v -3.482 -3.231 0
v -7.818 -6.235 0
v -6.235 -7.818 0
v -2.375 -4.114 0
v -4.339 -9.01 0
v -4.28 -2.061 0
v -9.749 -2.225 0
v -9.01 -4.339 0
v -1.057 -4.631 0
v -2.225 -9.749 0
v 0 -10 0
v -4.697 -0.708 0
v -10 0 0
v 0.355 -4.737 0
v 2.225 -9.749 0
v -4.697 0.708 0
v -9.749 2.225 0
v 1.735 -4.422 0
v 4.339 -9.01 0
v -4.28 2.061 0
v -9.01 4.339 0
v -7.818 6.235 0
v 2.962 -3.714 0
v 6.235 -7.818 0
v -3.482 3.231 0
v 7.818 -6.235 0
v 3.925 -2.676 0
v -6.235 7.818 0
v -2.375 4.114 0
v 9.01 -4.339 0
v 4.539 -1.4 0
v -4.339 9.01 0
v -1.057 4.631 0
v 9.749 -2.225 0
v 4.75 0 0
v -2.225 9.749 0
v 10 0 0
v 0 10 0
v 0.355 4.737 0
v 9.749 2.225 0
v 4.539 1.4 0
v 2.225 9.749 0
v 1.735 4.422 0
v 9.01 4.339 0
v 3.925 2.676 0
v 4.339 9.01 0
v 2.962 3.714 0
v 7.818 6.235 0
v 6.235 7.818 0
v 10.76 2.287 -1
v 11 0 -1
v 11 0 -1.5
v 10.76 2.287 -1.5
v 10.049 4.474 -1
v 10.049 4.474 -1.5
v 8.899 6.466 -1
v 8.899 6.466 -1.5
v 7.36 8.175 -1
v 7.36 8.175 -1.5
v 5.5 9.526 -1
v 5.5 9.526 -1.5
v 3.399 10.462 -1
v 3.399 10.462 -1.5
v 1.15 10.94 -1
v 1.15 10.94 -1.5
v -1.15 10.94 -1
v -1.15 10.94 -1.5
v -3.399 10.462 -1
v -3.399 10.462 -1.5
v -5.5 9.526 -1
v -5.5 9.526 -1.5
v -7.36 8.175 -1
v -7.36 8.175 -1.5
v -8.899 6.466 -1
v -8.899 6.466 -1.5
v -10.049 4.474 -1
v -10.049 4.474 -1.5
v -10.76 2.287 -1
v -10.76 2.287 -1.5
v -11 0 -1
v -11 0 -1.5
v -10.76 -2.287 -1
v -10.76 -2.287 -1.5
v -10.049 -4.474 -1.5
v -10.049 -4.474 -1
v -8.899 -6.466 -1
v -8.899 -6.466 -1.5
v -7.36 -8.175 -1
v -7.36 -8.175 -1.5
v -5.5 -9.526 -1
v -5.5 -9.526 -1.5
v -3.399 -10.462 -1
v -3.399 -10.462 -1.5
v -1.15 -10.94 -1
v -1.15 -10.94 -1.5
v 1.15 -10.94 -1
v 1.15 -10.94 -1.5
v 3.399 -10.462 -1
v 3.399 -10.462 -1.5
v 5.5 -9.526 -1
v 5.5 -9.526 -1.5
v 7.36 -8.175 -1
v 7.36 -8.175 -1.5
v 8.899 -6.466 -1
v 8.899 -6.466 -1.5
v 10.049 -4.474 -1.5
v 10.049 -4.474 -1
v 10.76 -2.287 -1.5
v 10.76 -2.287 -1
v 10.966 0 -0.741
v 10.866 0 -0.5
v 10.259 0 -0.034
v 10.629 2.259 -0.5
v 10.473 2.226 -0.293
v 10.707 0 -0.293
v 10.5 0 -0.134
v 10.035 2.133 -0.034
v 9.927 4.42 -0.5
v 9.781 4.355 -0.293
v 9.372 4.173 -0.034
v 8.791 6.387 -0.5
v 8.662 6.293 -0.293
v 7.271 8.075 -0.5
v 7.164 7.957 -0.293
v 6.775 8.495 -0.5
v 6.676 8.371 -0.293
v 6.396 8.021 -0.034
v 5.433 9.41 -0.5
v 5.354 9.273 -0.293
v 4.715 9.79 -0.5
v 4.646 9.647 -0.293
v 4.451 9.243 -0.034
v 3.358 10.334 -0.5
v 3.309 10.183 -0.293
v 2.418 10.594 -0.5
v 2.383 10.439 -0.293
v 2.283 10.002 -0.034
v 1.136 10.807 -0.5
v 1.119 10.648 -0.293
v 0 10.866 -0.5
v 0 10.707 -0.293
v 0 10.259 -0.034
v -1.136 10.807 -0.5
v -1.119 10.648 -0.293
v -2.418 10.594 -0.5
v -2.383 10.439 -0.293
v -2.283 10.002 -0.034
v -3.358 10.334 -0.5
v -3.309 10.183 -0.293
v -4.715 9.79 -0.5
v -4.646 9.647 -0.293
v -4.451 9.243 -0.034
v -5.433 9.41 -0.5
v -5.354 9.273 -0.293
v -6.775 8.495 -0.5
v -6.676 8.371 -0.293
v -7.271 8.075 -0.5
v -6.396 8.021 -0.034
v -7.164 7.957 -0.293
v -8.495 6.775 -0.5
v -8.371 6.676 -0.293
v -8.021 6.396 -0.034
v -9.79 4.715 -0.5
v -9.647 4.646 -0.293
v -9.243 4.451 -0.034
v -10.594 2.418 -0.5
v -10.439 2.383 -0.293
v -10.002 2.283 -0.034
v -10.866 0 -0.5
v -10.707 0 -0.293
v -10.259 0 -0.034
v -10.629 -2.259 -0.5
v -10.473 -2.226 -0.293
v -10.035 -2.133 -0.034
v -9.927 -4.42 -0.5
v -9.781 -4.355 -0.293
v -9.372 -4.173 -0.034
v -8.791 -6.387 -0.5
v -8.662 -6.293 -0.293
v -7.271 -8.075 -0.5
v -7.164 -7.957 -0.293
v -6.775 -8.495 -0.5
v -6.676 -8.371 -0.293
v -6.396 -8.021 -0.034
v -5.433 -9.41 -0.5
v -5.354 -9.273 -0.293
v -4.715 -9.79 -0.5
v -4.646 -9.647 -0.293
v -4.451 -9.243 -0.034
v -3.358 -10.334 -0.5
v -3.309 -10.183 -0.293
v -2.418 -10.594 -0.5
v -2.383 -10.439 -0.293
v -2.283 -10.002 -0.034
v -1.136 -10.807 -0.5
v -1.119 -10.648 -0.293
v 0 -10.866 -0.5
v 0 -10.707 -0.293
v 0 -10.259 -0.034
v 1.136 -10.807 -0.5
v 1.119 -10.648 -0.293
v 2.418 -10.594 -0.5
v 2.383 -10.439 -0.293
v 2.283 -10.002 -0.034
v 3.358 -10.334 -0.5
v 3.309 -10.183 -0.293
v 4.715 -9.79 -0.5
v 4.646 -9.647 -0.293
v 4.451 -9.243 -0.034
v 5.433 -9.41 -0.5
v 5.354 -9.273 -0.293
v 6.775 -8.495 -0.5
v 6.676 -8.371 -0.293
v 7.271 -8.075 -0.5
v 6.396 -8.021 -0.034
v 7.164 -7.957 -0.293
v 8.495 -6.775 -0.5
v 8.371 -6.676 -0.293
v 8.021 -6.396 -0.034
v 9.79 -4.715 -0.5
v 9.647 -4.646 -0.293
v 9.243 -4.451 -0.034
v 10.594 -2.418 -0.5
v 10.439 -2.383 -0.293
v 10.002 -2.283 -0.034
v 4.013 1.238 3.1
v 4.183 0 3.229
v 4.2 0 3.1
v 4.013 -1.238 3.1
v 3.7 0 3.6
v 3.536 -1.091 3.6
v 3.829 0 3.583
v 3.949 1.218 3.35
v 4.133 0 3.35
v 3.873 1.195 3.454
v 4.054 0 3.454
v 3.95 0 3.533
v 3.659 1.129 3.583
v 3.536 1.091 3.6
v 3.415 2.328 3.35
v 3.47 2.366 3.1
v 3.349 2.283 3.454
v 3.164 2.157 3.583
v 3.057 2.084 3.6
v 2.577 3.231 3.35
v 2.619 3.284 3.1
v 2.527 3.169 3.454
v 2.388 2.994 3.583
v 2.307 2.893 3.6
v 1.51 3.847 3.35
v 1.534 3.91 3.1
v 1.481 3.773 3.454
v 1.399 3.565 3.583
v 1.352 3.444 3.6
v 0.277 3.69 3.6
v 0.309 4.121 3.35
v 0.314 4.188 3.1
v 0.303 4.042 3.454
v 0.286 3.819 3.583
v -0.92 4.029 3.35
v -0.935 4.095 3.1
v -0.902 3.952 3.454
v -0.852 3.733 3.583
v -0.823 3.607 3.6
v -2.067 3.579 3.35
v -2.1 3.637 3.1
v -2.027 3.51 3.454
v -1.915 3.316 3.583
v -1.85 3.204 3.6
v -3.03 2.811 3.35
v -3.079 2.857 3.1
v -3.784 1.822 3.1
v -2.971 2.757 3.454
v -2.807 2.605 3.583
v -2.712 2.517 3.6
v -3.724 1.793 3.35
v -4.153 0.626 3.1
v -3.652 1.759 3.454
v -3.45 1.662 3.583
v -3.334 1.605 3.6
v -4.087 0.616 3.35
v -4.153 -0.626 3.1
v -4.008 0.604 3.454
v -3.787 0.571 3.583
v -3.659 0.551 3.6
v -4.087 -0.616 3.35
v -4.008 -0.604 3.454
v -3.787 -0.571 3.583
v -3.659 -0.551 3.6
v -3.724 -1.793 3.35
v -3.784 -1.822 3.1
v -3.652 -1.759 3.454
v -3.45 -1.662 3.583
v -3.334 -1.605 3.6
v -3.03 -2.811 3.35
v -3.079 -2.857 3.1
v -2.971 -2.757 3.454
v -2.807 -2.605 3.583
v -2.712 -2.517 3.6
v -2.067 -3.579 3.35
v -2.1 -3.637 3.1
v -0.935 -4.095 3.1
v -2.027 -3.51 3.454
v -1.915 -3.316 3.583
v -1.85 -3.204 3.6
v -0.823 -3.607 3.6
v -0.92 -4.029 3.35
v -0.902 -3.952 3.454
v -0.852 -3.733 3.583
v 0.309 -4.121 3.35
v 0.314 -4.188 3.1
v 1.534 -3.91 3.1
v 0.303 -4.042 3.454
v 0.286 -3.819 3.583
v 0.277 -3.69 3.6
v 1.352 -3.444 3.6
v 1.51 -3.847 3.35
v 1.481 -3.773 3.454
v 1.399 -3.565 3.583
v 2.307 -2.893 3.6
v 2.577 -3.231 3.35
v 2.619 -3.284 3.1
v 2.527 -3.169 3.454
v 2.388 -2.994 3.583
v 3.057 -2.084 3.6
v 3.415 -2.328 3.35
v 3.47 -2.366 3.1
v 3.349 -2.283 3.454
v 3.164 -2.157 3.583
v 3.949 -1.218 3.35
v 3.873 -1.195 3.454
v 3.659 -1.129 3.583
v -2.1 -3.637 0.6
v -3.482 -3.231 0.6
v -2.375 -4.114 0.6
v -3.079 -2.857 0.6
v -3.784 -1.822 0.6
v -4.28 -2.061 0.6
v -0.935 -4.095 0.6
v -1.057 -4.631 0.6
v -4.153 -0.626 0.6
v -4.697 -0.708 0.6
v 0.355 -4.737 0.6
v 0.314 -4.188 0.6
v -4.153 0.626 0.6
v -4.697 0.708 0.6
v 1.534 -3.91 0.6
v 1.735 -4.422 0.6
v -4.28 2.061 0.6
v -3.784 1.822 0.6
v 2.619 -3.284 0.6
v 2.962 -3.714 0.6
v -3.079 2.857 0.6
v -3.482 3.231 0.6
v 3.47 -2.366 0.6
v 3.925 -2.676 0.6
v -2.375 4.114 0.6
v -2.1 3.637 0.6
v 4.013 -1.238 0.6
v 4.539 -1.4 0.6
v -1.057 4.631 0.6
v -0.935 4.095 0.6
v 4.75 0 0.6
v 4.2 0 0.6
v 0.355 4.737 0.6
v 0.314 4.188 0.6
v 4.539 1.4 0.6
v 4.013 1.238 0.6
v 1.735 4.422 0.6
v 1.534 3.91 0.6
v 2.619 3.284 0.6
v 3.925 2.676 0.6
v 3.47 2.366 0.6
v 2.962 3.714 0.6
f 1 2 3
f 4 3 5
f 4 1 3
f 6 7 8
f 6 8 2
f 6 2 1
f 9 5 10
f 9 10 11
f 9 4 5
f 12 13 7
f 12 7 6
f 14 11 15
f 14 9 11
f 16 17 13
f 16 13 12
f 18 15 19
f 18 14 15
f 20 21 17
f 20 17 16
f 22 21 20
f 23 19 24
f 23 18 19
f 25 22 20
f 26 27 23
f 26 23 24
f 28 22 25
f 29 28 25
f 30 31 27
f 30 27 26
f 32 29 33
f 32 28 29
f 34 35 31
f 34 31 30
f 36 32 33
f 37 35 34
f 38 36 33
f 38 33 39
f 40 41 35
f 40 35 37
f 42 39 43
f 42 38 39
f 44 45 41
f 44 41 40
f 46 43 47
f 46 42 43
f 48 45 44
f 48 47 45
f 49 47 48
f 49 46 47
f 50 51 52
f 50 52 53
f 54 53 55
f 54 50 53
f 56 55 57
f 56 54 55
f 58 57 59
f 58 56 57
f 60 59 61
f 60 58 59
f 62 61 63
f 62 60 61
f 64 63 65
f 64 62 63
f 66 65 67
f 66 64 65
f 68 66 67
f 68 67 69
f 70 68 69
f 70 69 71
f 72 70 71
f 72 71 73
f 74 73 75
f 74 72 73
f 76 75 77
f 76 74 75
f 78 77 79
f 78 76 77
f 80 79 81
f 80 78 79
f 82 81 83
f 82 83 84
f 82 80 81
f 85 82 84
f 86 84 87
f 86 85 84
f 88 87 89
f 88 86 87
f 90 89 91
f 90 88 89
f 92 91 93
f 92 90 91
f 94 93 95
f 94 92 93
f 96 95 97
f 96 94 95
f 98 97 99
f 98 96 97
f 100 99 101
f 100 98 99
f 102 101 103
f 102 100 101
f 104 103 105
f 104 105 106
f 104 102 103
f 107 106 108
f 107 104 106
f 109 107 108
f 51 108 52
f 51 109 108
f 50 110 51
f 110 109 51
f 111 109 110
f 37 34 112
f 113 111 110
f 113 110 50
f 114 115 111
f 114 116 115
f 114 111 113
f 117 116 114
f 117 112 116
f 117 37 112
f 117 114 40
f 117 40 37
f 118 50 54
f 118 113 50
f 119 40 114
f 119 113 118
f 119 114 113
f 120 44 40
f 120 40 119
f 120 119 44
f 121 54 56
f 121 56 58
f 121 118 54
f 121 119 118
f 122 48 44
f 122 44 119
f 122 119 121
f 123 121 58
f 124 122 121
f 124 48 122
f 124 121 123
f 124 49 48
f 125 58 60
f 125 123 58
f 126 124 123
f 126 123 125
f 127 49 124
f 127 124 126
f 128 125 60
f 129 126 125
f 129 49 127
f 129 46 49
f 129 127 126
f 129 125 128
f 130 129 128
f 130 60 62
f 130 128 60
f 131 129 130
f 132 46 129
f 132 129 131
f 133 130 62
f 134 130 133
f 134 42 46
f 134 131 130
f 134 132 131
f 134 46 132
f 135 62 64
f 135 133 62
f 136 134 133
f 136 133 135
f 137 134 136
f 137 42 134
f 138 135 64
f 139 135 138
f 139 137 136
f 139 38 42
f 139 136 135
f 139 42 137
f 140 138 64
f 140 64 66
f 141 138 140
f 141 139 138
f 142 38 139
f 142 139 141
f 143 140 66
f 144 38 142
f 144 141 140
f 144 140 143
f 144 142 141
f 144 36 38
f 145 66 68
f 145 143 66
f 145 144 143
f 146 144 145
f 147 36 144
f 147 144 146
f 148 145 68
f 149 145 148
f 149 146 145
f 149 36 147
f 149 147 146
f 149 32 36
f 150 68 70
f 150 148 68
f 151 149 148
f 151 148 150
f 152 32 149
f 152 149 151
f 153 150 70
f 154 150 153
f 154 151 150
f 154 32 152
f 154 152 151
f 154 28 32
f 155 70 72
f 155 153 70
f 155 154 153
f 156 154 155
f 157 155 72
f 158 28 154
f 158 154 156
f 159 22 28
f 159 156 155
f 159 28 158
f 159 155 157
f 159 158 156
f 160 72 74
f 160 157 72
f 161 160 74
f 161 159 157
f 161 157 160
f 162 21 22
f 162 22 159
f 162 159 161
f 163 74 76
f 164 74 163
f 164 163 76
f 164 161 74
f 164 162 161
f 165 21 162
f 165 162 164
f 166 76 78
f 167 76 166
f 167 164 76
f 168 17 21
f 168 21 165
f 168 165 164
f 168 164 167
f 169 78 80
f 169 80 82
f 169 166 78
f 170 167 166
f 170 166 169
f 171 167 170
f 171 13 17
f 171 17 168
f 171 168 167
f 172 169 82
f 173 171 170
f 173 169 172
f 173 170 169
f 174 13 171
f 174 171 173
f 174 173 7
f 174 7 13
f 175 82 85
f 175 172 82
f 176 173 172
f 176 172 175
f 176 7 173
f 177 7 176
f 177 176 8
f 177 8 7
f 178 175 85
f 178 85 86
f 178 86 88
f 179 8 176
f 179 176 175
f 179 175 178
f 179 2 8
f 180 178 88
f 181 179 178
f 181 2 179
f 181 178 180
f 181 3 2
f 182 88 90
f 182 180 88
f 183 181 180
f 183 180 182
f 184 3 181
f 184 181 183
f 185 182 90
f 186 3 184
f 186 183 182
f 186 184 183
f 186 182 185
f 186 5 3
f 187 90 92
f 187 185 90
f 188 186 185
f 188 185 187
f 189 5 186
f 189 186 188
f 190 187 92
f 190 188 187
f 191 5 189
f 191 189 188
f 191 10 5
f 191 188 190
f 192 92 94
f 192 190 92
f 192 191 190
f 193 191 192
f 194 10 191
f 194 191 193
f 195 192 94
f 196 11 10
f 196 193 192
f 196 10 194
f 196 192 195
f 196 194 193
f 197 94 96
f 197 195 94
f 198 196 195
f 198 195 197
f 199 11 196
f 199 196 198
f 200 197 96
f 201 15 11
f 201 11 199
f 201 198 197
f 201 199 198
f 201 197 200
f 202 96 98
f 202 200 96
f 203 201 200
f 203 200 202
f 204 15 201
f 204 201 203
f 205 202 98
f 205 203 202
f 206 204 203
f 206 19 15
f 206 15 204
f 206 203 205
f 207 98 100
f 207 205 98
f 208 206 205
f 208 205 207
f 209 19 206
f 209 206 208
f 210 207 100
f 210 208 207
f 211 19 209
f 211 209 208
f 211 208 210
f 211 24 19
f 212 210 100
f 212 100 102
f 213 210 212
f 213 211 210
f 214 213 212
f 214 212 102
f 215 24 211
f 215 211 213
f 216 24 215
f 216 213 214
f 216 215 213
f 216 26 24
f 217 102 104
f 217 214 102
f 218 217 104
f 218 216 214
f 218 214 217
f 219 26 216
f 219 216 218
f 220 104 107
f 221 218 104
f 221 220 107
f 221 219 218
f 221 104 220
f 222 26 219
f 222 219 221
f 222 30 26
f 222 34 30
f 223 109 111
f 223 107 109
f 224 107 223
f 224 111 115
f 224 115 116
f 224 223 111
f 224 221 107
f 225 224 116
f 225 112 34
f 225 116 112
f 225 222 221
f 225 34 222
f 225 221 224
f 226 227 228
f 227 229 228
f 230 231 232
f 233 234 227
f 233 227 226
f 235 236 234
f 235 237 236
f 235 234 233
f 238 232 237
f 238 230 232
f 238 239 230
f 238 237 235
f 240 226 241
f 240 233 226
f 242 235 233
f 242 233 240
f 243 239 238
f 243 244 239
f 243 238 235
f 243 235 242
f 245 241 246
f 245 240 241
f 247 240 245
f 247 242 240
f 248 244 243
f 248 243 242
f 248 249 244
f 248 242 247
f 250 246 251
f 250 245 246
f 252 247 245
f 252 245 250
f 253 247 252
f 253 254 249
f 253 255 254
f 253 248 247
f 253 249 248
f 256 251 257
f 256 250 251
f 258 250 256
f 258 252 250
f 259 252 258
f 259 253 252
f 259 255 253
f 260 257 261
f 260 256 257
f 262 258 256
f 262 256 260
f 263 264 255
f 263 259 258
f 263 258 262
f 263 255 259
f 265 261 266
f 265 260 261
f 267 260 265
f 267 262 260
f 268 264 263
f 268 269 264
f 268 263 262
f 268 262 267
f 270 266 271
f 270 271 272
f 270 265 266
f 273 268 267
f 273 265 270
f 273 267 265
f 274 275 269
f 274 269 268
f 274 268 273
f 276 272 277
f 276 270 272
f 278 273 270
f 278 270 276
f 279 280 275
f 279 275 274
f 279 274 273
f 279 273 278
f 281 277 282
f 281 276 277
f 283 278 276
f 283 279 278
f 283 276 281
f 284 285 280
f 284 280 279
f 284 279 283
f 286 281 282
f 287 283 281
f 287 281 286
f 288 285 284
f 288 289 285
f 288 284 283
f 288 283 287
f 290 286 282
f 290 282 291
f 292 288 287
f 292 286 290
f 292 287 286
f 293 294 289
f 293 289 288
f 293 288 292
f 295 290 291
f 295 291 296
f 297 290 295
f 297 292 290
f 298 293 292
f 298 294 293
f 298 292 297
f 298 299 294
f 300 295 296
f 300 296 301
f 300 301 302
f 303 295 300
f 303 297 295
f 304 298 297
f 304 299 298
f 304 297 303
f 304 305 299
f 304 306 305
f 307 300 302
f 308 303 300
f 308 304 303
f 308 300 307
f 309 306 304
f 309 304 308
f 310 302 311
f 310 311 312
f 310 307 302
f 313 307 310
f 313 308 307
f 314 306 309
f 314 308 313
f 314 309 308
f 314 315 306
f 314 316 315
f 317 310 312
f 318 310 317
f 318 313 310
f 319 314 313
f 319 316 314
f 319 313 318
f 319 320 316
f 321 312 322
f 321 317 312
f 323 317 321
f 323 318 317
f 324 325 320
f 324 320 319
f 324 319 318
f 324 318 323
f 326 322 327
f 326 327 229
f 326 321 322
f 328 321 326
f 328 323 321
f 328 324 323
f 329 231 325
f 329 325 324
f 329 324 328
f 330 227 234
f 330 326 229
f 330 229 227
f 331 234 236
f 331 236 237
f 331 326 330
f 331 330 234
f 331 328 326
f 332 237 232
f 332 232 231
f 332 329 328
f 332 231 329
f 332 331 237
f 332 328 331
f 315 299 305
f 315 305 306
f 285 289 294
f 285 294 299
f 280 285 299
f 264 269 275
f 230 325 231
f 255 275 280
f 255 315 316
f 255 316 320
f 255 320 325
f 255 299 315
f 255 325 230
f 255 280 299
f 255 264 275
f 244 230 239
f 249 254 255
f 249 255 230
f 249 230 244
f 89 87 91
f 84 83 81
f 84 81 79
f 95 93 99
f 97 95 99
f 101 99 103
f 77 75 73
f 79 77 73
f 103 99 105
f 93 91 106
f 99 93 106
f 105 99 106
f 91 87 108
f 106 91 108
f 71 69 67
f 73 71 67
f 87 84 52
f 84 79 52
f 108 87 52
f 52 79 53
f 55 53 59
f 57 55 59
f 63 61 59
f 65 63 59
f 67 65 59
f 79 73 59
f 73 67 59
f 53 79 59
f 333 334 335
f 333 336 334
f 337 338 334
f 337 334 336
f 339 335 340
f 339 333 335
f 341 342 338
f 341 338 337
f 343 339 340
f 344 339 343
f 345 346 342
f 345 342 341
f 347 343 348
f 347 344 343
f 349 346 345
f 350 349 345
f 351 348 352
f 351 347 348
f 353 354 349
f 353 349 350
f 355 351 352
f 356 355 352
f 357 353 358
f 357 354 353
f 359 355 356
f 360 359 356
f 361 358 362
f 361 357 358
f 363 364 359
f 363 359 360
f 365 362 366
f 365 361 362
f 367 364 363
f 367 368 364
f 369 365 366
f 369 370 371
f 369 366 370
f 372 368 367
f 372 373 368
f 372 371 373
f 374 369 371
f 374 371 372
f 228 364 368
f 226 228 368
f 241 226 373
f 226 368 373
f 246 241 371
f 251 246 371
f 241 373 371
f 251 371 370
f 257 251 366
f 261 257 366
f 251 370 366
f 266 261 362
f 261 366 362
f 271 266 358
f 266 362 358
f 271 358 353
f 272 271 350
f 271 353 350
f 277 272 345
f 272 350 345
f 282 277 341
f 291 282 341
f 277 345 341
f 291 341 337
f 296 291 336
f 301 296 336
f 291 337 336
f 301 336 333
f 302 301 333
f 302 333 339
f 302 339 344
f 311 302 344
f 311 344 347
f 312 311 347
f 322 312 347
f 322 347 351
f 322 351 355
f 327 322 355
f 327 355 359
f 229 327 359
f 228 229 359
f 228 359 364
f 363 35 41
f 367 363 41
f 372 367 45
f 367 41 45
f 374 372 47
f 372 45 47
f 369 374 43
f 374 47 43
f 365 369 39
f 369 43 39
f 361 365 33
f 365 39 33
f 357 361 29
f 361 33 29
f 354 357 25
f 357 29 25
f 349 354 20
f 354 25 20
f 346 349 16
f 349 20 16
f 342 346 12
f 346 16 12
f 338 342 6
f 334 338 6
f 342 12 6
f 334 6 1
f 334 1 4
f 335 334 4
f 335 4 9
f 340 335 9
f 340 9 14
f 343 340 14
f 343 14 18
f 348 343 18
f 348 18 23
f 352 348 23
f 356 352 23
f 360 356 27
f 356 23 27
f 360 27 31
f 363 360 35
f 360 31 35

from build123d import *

# Parameters (mm, degrees)
F0_R     = 11
F0_R_2   = 4.75
F0_R_3   = 4.2
F1_DEPTH = 1.5
F2_DEPTH = 3.6
F3_R     = 1
F4_R     = 0.5
F5_DEPTH = 0.6


with BuildPart() as f1:
    # F0 (on Top) → F1 (new body)
    with BuildSketch(Plane.XY):
        Circle(F0_R)
        Circle(F0_R_2, mode=Mode.SUBTRACT)
        Circle(F0_R_2)
        Circle(F0_R_3, mode=Mode.SUBTRACT)
        Circle(F0_R_3)
    extrude(amount=-F1_DEPTH)

    # F0 (on Top) → F2 (join)
    with BuildSketch(Plane.XY):
        Circle(F0_R_3)
    extrude(amount=F2_DEPTH)

    # F3
    f3_edges = [f1.edges().sort_by_distance(p)[0] for p in [
        (-11, 0, 0),
    ]]
    fillet(f3_edges, radius=F3_R)

    # F4
    f4_edges = [f1.edges().sort_by_distance(p)[0] for p in [
        (-4.2, 0, 3.6),
    ]]
    fillet(f4_edges, radius=F4_R)

    # F0 (on Top) → F5 (join)
    with BuildSketch(Plane.XY):
        Circle(F0_R_2)
        Circle(F0_R_3, mode=Mode.SUBTRACT)
    extrude(amount=F5_DEPTH)


solid = f1.part
